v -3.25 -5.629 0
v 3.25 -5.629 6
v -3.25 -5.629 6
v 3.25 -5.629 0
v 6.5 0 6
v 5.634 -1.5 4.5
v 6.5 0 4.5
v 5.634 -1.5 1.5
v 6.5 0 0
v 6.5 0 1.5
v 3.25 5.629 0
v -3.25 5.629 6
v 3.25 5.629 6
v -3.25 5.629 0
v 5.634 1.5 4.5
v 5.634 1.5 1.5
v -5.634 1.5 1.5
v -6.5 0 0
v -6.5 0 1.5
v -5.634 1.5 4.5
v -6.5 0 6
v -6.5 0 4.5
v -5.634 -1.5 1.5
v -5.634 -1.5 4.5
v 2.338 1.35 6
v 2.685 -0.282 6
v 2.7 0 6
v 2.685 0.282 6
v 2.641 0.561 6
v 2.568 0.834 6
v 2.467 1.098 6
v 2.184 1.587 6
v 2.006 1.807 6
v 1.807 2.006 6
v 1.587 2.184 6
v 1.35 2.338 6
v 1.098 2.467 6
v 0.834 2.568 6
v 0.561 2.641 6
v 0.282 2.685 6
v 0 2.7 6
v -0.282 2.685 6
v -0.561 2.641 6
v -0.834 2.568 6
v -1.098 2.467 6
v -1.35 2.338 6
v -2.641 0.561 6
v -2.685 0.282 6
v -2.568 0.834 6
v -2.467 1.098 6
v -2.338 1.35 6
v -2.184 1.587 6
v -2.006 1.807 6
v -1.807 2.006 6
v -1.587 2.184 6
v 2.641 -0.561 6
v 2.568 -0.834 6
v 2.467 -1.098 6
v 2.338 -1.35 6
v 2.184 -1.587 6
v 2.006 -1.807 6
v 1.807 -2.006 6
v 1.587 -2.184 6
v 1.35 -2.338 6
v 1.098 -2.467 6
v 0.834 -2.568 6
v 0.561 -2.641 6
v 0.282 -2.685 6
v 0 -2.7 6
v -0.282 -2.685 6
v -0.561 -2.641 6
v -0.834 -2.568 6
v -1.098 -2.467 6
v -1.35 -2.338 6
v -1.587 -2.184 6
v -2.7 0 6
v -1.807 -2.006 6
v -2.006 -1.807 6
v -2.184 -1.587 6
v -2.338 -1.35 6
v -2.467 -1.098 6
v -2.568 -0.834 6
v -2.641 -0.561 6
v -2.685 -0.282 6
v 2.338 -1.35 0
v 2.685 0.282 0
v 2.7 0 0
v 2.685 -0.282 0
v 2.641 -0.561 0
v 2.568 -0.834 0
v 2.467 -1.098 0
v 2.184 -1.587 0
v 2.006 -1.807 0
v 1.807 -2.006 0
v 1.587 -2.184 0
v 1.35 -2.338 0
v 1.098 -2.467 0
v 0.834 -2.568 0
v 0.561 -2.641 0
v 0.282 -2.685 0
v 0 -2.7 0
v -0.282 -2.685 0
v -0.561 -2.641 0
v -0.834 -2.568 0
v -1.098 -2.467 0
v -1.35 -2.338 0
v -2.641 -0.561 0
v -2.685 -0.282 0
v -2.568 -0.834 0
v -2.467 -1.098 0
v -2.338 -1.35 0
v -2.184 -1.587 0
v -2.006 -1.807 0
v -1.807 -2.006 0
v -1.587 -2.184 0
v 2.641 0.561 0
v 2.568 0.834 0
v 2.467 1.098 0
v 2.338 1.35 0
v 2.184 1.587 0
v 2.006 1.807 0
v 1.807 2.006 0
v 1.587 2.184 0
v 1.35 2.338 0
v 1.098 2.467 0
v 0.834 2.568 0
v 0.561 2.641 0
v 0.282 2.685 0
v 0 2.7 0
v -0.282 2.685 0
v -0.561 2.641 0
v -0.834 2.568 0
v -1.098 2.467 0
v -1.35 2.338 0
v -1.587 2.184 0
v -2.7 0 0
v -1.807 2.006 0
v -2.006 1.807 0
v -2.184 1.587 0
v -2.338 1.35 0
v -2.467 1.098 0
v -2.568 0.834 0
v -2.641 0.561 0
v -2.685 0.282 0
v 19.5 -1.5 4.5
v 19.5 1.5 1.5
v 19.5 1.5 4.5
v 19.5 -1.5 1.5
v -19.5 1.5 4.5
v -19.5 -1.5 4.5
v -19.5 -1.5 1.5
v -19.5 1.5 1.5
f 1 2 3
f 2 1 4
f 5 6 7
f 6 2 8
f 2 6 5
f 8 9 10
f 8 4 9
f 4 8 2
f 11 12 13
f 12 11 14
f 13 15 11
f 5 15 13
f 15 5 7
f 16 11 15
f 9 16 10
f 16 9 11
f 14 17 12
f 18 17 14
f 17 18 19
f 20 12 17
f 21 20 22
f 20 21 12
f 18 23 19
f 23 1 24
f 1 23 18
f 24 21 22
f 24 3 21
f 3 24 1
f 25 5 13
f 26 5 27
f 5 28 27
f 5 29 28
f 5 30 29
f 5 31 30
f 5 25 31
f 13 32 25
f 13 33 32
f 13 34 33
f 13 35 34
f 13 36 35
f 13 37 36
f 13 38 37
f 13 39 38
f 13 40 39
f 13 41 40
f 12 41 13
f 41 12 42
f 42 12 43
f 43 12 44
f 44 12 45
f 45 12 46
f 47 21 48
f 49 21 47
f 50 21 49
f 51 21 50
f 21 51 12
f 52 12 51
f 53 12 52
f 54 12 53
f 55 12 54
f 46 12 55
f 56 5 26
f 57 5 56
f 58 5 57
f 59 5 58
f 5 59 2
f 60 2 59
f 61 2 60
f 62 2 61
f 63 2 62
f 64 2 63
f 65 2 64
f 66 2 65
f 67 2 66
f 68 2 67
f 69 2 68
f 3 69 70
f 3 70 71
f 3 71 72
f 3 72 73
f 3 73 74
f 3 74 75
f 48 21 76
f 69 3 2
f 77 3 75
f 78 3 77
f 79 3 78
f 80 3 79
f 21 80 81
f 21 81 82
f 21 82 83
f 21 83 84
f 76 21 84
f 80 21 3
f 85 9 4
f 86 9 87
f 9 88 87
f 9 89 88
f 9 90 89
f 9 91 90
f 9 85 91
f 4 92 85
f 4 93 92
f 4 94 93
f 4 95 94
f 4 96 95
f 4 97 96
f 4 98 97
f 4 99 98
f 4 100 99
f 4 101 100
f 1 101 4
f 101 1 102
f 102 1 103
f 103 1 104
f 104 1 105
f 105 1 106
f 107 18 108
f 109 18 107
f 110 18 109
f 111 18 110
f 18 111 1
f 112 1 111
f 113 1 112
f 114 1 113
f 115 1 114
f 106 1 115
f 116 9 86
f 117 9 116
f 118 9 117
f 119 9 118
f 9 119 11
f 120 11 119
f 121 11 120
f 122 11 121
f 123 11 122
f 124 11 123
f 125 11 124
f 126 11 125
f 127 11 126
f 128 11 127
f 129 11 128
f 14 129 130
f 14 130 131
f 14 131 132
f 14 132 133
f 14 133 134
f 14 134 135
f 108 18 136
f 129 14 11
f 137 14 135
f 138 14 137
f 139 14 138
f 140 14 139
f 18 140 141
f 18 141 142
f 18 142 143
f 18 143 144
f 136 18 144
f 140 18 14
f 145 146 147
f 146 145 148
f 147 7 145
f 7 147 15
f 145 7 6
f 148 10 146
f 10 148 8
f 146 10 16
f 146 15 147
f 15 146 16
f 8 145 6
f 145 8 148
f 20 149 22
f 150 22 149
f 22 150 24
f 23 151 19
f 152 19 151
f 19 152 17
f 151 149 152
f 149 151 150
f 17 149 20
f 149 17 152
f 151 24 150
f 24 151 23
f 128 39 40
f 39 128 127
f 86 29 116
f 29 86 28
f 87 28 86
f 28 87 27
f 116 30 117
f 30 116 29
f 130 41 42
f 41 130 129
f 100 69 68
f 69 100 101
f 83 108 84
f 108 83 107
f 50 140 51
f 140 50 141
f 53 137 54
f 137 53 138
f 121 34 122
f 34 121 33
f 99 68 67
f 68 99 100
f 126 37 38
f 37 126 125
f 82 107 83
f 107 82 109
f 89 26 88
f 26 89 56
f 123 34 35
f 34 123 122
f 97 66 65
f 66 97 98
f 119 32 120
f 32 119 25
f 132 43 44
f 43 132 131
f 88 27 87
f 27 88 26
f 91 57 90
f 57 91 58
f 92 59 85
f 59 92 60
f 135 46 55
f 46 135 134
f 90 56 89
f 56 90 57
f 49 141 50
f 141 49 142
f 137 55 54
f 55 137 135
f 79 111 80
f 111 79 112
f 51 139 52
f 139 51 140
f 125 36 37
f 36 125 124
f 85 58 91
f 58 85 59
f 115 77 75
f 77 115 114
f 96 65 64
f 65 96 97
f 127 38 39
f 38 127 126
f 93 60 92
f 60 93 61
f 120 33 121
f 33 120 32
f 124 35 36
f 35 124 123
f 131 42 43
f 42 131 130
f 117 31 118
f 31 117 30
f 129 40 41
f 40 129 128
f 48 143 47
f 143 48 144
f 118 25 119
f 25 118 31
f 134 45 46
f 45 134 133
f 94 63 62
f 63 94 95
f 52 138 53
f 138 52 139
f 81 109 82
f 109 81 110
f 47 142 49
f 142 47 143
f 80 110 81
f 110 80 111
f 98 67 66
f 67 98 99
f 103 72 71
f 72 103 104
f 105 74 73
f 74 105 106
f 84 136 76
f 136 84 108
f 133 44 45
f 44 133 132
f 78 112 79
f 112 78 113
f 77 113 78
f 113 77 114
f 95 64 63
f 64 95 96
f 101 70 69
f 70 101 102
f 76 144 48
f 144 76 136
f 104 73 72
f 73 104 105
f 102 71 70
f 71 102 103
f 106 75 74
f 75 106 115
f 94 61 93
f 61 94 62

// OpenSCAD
// Wing nut with two reinforced wings.
$fn = 60;
eps = 0.02;
thread_d = 5.4;
body_d = 13;
body_h = 6;
wing_l = 14;
wing_t = 3;
difference() {
    union() {
        cylinder(d = body_d, h = body_h, $fn = 6);
        translate([body_d / 2 - 1, -wing_t / 2, body_h / 2 - wing_t / 2]) cube([wing_l, wing_t, wing_t]);
        translate([-body_d / 2 - wing_l + 1, -wing_t / 2, body_h / 2 - wing_t / 2]) cube([wing_l, wing_t, wing_t]);
    }
    translate([0, 0, -eps]) cylinder(d = thread_d, h = body_h + 2 * eps);
}
